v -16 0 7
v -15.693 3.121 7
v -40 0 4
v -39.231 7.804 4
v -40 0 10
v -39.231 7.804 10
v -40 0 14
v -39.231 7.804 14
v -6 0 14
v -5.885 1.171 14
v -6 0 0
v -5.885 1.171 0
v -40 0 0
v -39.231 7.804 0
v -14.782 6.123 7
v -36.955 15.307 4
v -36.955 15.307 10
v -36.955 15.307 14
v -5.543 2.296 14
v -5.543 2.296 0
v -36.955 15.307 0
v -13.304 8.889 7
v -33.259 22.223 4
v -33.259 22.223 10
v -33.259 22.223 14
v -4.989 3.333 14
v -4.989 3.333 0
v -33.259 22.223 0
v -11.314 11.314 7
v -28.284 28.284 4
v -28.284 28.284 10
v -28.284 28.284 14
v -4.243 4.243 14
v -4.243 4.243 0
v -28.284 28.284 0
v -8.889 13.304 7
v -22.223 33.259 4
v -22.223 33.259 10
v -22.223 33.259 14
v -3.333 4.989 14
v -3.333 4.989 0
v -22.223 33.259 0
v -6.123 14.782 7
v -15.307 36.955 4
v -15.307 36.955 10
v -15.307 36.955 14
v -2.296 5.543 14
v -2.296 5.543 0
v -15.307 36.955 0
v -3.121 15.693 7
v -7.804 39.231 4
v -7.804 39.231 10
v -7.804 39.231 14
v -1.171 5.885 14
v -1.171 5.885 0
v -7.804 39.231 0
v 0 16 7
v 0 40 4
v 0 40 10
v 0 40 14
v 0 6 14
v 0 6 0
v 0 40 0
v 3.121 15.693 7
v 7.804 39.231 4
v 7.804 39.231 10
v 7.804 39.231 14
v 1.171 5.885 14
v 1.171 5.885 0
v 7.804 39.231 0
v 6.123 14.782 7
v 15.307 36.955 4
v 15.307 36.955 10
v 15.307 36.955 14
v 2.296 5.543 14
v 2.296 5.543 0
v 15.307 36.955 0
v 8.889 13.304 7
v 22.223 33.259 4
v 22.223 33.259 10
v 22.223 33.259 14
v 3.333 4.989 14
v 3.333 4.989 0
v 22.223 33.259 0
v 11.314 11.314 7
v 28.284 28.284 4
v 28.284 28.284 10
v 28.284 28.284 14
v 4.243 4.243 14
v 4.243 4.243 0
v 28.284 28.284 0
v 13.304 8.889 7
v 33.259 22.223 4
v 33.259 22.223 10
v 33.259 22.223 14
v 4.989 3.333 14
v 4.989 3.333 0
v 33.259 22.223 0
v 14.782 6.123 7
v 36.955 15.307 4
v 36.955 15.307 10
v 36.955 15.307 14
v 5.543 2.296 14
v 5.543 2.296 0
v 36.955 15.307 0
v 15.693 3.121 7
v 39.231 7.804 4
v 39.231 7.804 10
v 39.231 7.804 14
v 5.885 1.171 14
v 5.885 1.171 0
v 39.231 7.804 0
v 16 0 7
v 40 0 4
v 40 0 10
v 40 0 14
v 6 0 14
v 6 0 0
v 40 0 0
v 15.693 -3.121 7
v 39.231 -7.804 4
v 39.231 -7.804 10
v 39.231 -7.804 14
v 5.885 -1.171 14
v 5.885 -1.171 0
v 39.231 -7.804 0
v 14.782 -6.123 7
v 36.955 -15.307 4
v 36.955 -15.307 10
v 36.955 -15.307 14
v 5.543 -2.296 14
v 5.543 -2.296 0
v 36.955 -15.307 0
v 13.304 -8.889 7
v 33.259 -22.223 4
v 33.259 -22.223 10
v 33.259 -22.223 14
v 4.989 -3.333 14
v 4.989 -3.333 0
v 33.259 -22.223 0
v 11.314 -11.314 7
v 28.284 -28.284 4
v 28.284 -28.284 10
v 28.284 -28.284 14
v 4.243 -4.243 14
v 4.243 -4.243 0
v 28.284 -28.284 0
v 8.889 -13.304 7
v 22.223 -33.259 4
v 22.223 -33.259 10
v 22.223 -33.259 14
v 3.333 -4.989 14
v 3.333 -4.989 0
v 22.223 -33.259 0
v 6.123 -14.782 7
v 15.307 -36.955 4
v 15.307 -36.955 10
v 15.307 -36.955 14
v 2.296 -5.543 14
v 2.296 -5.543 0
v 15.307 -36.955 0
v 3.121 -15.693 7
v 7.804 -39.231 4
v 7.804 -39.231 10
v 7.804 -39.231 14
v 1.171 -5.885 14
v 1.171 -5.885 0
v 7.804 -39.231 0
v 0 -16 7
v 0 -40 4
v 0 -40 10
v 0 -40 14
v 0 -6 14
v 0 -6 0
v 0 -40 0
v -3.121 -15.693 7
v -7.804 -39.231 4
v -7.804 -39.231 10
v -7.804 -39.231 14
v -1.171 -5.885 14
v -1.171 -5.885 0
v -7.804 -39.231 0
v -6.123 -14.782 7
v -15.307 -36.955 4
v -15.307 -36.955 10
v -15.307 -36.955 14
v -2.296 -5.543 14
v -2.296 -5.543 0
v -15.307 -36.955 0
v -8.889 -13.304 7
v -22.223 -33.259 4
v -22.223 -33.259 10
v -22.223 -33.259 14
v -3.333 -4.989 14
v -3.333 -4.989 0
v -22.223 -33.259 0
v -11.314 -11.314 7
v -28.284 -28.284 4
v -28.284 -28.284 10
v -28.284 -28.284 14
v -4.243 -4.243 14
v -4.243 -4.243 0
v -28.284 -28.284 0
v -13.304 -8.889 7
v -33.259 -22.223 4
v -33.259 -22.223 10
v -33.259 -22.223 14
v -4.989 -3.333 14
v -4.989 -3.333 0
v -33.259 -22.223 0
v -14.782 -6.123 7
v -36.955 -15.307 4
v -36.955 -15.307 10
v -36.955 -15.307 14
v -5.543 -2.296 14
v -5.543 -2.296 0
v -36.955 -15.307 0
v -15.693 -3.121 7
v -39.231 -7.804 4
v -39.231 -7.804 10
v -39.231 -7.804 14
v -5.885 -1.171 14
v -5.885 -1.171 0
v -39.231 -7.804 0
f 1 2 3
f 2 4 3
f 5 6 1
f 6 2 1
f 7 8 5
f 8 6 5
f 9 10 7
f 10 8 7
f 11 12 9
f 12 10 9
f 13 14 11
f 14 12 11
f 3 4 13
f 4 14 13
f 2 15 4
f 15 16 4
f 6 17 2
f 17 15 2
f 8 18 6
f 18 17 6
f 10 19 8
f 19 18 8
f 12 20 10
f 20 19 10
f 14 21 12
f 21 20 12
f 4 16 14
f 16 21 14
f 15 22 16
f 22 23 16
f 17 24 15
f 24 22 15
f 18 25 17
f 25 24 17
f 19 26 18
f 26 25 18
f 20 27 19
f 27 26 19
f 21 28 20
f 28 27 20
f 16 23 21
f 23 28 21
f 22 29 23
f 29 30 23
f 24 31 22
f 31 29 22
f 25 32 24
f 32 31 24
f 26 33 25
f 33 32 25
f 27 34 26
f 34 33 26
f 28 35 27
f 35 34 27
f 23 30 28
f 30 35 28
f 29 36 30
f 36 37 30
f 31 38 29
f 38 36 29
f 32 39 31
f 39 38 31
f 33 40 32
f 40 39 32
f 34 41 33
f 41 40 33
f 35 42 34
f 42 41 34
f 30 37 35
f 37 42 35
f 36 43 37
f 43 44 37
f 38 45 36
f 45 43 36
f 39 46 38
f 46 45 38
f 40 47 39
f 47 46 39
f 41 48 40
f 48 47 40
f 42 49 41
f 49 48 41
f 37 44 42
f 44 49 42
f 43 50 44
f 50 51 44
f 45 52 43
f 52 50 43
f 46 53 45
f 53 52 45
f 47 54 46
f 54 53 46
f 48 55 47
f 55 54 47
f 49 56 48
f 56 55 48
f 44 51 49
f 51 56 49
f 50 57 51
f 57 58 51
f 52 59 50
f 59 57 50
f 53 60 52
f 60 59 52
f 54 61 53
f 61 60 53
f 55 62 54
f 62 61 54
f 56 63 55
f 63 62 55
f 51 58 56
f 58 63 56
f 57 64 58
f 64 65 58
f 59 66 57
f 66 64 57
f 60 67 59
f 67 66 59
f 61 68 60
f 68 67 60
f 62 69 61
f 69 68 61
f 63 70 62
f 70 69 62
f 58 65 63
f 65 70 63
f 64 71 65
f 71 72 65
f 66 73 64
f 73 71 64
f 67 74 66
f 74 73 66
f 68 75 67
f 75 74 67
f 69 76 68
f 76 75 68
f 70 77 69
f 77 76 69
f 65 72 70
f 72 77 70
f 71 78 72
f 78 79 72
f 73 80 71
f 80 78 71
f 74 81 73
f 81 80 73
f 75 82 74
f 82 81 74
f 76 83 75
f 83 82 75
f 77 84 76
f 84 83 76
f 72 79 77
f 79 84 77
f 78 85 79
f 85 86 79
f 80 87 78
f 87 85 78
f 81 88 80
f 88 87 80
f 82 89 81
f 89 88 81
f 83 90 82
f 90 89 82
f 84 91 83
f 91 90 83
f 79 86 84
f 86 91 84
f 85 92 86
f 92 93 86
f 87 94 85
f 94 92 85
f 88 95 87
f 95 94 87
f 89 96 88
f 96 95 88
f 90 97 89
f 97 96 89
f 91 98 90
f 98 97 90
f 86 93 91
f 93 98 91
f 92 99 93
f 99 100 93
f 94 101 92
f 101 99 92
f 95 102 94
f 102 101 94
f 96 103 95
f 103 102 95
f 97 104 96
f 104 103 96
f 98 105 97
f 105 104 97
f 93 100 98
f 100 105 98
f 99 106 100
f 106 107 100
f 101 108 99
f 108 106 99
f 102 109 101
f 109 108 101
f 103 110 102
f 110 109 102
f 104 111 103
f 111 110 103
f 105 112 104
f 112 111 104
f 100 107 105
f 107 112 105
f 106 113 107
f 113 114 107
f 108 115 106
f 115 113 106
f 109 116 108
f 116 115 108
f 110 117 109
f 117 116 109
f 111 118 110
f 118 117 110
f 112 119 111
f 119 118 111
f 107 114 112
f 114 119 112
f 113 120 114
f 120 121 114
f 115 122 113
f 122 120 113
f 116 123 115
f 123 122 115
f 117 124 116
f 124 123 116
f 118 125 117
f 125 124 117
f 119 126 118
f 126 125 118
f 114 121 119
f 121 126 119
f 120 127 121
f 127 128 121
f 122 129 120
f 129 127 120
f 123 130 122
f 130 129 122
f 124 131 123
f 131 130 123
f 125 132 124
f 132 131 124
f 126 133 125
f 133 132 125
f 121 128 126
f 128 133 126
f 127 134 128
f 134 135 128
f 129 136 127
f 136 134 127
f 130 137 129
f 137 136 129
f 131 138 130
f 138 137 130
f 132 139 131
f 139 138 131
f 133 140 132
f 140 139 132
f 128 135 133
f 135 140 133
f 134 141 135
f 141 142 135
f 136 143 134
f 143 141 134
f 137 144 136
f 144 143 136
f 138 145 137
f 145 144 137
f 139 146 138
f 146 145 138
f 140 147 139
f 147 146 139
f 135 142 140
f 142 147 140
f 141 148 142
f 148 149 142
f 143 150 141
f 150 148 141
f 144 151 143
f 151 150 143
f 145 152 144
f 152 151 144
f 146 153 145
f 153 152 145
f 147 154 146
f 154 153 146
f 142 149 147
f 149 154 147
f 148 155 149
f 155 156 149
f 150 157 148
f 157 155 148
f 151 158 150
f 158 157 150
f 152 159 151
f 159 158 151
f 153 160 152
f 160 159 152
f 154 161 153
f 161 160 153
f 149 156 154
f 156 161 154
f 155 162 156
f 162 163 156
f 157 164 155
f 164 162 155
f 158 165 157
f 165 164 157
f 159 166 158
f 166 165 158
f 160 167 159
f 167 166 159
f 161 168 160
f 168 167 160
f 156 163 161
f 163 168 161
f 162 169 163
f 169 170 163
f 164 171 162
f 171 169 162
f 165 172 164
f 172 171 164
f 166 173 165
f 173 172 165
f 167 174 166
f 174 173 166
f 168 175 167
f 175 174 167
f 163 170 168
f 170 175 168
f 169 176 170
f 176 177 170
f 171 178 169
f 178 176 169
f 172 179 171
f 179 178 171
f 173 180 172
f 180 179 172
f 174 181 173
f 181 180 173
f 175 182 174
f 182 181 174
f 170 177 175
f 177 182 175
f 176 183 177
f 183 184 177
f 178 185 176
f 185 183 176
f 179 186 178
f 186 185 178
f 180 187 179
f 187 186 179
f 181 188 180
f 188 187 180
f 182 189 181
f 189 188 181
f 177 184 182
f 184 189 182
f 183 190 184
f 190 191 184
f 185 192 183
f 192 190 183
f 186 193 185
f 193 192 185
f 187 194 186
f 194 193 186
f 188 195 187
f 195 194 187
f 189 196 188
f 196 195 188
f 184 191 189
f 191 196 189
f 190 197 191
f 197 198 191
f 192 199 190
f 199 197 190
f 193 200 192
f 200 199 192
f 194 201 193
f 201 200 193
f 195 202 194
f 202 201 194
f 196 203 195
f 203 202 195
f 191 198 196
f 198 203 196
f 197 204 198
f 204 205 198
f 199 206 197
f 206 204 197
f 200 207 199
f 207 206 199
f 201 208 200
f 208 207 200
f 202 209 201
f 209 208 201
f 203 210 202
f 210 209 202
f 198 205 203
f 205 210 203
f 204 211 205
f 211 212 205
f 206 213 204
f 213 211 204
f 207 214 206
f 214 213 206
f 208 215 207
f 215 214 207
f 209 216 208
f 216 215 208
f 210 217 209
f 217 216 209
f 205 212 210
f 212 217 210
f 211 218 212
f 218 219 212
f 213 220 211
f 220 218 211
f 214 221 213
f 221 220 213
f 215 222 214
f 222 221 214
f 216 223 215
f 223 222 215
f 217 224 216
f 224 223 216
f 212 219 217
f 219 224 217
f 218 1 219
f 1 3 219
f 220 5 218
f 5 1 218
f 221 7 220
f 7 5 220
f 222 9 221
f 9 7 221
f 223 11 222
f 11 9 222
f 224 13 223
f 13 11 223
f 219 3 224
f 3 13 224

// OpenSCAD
$fn = 32;

// ----------------------------------------------------------------------
// Revolved part: V-groove pulley R40
// ----------------------------------------------------------------------

// --- parameters (mm) ---
bore_r = 6;               // bore radius
rim_r = 40;               // rim radius
rim_t = 14;               // rim width
groove_r = 16;            // groove root radius
groove_w = 3;             // groove half width
revolve_angle = 360;      // revolve sweep, degrees

bore_d = 2 * bore_r;
rim_d = 2 * rim_r;
groove_d = 2 * groove_r;

profile = [[6, 0], [40, 0], [40, 4], [16, 7], [40, 10], [40, 14], [6, 14]];  // primary outline, 7 points, counter clockwise

// --- the one profile operation ---
rotate_extrude(angle = revolve_angle) polygon(points = profile);
